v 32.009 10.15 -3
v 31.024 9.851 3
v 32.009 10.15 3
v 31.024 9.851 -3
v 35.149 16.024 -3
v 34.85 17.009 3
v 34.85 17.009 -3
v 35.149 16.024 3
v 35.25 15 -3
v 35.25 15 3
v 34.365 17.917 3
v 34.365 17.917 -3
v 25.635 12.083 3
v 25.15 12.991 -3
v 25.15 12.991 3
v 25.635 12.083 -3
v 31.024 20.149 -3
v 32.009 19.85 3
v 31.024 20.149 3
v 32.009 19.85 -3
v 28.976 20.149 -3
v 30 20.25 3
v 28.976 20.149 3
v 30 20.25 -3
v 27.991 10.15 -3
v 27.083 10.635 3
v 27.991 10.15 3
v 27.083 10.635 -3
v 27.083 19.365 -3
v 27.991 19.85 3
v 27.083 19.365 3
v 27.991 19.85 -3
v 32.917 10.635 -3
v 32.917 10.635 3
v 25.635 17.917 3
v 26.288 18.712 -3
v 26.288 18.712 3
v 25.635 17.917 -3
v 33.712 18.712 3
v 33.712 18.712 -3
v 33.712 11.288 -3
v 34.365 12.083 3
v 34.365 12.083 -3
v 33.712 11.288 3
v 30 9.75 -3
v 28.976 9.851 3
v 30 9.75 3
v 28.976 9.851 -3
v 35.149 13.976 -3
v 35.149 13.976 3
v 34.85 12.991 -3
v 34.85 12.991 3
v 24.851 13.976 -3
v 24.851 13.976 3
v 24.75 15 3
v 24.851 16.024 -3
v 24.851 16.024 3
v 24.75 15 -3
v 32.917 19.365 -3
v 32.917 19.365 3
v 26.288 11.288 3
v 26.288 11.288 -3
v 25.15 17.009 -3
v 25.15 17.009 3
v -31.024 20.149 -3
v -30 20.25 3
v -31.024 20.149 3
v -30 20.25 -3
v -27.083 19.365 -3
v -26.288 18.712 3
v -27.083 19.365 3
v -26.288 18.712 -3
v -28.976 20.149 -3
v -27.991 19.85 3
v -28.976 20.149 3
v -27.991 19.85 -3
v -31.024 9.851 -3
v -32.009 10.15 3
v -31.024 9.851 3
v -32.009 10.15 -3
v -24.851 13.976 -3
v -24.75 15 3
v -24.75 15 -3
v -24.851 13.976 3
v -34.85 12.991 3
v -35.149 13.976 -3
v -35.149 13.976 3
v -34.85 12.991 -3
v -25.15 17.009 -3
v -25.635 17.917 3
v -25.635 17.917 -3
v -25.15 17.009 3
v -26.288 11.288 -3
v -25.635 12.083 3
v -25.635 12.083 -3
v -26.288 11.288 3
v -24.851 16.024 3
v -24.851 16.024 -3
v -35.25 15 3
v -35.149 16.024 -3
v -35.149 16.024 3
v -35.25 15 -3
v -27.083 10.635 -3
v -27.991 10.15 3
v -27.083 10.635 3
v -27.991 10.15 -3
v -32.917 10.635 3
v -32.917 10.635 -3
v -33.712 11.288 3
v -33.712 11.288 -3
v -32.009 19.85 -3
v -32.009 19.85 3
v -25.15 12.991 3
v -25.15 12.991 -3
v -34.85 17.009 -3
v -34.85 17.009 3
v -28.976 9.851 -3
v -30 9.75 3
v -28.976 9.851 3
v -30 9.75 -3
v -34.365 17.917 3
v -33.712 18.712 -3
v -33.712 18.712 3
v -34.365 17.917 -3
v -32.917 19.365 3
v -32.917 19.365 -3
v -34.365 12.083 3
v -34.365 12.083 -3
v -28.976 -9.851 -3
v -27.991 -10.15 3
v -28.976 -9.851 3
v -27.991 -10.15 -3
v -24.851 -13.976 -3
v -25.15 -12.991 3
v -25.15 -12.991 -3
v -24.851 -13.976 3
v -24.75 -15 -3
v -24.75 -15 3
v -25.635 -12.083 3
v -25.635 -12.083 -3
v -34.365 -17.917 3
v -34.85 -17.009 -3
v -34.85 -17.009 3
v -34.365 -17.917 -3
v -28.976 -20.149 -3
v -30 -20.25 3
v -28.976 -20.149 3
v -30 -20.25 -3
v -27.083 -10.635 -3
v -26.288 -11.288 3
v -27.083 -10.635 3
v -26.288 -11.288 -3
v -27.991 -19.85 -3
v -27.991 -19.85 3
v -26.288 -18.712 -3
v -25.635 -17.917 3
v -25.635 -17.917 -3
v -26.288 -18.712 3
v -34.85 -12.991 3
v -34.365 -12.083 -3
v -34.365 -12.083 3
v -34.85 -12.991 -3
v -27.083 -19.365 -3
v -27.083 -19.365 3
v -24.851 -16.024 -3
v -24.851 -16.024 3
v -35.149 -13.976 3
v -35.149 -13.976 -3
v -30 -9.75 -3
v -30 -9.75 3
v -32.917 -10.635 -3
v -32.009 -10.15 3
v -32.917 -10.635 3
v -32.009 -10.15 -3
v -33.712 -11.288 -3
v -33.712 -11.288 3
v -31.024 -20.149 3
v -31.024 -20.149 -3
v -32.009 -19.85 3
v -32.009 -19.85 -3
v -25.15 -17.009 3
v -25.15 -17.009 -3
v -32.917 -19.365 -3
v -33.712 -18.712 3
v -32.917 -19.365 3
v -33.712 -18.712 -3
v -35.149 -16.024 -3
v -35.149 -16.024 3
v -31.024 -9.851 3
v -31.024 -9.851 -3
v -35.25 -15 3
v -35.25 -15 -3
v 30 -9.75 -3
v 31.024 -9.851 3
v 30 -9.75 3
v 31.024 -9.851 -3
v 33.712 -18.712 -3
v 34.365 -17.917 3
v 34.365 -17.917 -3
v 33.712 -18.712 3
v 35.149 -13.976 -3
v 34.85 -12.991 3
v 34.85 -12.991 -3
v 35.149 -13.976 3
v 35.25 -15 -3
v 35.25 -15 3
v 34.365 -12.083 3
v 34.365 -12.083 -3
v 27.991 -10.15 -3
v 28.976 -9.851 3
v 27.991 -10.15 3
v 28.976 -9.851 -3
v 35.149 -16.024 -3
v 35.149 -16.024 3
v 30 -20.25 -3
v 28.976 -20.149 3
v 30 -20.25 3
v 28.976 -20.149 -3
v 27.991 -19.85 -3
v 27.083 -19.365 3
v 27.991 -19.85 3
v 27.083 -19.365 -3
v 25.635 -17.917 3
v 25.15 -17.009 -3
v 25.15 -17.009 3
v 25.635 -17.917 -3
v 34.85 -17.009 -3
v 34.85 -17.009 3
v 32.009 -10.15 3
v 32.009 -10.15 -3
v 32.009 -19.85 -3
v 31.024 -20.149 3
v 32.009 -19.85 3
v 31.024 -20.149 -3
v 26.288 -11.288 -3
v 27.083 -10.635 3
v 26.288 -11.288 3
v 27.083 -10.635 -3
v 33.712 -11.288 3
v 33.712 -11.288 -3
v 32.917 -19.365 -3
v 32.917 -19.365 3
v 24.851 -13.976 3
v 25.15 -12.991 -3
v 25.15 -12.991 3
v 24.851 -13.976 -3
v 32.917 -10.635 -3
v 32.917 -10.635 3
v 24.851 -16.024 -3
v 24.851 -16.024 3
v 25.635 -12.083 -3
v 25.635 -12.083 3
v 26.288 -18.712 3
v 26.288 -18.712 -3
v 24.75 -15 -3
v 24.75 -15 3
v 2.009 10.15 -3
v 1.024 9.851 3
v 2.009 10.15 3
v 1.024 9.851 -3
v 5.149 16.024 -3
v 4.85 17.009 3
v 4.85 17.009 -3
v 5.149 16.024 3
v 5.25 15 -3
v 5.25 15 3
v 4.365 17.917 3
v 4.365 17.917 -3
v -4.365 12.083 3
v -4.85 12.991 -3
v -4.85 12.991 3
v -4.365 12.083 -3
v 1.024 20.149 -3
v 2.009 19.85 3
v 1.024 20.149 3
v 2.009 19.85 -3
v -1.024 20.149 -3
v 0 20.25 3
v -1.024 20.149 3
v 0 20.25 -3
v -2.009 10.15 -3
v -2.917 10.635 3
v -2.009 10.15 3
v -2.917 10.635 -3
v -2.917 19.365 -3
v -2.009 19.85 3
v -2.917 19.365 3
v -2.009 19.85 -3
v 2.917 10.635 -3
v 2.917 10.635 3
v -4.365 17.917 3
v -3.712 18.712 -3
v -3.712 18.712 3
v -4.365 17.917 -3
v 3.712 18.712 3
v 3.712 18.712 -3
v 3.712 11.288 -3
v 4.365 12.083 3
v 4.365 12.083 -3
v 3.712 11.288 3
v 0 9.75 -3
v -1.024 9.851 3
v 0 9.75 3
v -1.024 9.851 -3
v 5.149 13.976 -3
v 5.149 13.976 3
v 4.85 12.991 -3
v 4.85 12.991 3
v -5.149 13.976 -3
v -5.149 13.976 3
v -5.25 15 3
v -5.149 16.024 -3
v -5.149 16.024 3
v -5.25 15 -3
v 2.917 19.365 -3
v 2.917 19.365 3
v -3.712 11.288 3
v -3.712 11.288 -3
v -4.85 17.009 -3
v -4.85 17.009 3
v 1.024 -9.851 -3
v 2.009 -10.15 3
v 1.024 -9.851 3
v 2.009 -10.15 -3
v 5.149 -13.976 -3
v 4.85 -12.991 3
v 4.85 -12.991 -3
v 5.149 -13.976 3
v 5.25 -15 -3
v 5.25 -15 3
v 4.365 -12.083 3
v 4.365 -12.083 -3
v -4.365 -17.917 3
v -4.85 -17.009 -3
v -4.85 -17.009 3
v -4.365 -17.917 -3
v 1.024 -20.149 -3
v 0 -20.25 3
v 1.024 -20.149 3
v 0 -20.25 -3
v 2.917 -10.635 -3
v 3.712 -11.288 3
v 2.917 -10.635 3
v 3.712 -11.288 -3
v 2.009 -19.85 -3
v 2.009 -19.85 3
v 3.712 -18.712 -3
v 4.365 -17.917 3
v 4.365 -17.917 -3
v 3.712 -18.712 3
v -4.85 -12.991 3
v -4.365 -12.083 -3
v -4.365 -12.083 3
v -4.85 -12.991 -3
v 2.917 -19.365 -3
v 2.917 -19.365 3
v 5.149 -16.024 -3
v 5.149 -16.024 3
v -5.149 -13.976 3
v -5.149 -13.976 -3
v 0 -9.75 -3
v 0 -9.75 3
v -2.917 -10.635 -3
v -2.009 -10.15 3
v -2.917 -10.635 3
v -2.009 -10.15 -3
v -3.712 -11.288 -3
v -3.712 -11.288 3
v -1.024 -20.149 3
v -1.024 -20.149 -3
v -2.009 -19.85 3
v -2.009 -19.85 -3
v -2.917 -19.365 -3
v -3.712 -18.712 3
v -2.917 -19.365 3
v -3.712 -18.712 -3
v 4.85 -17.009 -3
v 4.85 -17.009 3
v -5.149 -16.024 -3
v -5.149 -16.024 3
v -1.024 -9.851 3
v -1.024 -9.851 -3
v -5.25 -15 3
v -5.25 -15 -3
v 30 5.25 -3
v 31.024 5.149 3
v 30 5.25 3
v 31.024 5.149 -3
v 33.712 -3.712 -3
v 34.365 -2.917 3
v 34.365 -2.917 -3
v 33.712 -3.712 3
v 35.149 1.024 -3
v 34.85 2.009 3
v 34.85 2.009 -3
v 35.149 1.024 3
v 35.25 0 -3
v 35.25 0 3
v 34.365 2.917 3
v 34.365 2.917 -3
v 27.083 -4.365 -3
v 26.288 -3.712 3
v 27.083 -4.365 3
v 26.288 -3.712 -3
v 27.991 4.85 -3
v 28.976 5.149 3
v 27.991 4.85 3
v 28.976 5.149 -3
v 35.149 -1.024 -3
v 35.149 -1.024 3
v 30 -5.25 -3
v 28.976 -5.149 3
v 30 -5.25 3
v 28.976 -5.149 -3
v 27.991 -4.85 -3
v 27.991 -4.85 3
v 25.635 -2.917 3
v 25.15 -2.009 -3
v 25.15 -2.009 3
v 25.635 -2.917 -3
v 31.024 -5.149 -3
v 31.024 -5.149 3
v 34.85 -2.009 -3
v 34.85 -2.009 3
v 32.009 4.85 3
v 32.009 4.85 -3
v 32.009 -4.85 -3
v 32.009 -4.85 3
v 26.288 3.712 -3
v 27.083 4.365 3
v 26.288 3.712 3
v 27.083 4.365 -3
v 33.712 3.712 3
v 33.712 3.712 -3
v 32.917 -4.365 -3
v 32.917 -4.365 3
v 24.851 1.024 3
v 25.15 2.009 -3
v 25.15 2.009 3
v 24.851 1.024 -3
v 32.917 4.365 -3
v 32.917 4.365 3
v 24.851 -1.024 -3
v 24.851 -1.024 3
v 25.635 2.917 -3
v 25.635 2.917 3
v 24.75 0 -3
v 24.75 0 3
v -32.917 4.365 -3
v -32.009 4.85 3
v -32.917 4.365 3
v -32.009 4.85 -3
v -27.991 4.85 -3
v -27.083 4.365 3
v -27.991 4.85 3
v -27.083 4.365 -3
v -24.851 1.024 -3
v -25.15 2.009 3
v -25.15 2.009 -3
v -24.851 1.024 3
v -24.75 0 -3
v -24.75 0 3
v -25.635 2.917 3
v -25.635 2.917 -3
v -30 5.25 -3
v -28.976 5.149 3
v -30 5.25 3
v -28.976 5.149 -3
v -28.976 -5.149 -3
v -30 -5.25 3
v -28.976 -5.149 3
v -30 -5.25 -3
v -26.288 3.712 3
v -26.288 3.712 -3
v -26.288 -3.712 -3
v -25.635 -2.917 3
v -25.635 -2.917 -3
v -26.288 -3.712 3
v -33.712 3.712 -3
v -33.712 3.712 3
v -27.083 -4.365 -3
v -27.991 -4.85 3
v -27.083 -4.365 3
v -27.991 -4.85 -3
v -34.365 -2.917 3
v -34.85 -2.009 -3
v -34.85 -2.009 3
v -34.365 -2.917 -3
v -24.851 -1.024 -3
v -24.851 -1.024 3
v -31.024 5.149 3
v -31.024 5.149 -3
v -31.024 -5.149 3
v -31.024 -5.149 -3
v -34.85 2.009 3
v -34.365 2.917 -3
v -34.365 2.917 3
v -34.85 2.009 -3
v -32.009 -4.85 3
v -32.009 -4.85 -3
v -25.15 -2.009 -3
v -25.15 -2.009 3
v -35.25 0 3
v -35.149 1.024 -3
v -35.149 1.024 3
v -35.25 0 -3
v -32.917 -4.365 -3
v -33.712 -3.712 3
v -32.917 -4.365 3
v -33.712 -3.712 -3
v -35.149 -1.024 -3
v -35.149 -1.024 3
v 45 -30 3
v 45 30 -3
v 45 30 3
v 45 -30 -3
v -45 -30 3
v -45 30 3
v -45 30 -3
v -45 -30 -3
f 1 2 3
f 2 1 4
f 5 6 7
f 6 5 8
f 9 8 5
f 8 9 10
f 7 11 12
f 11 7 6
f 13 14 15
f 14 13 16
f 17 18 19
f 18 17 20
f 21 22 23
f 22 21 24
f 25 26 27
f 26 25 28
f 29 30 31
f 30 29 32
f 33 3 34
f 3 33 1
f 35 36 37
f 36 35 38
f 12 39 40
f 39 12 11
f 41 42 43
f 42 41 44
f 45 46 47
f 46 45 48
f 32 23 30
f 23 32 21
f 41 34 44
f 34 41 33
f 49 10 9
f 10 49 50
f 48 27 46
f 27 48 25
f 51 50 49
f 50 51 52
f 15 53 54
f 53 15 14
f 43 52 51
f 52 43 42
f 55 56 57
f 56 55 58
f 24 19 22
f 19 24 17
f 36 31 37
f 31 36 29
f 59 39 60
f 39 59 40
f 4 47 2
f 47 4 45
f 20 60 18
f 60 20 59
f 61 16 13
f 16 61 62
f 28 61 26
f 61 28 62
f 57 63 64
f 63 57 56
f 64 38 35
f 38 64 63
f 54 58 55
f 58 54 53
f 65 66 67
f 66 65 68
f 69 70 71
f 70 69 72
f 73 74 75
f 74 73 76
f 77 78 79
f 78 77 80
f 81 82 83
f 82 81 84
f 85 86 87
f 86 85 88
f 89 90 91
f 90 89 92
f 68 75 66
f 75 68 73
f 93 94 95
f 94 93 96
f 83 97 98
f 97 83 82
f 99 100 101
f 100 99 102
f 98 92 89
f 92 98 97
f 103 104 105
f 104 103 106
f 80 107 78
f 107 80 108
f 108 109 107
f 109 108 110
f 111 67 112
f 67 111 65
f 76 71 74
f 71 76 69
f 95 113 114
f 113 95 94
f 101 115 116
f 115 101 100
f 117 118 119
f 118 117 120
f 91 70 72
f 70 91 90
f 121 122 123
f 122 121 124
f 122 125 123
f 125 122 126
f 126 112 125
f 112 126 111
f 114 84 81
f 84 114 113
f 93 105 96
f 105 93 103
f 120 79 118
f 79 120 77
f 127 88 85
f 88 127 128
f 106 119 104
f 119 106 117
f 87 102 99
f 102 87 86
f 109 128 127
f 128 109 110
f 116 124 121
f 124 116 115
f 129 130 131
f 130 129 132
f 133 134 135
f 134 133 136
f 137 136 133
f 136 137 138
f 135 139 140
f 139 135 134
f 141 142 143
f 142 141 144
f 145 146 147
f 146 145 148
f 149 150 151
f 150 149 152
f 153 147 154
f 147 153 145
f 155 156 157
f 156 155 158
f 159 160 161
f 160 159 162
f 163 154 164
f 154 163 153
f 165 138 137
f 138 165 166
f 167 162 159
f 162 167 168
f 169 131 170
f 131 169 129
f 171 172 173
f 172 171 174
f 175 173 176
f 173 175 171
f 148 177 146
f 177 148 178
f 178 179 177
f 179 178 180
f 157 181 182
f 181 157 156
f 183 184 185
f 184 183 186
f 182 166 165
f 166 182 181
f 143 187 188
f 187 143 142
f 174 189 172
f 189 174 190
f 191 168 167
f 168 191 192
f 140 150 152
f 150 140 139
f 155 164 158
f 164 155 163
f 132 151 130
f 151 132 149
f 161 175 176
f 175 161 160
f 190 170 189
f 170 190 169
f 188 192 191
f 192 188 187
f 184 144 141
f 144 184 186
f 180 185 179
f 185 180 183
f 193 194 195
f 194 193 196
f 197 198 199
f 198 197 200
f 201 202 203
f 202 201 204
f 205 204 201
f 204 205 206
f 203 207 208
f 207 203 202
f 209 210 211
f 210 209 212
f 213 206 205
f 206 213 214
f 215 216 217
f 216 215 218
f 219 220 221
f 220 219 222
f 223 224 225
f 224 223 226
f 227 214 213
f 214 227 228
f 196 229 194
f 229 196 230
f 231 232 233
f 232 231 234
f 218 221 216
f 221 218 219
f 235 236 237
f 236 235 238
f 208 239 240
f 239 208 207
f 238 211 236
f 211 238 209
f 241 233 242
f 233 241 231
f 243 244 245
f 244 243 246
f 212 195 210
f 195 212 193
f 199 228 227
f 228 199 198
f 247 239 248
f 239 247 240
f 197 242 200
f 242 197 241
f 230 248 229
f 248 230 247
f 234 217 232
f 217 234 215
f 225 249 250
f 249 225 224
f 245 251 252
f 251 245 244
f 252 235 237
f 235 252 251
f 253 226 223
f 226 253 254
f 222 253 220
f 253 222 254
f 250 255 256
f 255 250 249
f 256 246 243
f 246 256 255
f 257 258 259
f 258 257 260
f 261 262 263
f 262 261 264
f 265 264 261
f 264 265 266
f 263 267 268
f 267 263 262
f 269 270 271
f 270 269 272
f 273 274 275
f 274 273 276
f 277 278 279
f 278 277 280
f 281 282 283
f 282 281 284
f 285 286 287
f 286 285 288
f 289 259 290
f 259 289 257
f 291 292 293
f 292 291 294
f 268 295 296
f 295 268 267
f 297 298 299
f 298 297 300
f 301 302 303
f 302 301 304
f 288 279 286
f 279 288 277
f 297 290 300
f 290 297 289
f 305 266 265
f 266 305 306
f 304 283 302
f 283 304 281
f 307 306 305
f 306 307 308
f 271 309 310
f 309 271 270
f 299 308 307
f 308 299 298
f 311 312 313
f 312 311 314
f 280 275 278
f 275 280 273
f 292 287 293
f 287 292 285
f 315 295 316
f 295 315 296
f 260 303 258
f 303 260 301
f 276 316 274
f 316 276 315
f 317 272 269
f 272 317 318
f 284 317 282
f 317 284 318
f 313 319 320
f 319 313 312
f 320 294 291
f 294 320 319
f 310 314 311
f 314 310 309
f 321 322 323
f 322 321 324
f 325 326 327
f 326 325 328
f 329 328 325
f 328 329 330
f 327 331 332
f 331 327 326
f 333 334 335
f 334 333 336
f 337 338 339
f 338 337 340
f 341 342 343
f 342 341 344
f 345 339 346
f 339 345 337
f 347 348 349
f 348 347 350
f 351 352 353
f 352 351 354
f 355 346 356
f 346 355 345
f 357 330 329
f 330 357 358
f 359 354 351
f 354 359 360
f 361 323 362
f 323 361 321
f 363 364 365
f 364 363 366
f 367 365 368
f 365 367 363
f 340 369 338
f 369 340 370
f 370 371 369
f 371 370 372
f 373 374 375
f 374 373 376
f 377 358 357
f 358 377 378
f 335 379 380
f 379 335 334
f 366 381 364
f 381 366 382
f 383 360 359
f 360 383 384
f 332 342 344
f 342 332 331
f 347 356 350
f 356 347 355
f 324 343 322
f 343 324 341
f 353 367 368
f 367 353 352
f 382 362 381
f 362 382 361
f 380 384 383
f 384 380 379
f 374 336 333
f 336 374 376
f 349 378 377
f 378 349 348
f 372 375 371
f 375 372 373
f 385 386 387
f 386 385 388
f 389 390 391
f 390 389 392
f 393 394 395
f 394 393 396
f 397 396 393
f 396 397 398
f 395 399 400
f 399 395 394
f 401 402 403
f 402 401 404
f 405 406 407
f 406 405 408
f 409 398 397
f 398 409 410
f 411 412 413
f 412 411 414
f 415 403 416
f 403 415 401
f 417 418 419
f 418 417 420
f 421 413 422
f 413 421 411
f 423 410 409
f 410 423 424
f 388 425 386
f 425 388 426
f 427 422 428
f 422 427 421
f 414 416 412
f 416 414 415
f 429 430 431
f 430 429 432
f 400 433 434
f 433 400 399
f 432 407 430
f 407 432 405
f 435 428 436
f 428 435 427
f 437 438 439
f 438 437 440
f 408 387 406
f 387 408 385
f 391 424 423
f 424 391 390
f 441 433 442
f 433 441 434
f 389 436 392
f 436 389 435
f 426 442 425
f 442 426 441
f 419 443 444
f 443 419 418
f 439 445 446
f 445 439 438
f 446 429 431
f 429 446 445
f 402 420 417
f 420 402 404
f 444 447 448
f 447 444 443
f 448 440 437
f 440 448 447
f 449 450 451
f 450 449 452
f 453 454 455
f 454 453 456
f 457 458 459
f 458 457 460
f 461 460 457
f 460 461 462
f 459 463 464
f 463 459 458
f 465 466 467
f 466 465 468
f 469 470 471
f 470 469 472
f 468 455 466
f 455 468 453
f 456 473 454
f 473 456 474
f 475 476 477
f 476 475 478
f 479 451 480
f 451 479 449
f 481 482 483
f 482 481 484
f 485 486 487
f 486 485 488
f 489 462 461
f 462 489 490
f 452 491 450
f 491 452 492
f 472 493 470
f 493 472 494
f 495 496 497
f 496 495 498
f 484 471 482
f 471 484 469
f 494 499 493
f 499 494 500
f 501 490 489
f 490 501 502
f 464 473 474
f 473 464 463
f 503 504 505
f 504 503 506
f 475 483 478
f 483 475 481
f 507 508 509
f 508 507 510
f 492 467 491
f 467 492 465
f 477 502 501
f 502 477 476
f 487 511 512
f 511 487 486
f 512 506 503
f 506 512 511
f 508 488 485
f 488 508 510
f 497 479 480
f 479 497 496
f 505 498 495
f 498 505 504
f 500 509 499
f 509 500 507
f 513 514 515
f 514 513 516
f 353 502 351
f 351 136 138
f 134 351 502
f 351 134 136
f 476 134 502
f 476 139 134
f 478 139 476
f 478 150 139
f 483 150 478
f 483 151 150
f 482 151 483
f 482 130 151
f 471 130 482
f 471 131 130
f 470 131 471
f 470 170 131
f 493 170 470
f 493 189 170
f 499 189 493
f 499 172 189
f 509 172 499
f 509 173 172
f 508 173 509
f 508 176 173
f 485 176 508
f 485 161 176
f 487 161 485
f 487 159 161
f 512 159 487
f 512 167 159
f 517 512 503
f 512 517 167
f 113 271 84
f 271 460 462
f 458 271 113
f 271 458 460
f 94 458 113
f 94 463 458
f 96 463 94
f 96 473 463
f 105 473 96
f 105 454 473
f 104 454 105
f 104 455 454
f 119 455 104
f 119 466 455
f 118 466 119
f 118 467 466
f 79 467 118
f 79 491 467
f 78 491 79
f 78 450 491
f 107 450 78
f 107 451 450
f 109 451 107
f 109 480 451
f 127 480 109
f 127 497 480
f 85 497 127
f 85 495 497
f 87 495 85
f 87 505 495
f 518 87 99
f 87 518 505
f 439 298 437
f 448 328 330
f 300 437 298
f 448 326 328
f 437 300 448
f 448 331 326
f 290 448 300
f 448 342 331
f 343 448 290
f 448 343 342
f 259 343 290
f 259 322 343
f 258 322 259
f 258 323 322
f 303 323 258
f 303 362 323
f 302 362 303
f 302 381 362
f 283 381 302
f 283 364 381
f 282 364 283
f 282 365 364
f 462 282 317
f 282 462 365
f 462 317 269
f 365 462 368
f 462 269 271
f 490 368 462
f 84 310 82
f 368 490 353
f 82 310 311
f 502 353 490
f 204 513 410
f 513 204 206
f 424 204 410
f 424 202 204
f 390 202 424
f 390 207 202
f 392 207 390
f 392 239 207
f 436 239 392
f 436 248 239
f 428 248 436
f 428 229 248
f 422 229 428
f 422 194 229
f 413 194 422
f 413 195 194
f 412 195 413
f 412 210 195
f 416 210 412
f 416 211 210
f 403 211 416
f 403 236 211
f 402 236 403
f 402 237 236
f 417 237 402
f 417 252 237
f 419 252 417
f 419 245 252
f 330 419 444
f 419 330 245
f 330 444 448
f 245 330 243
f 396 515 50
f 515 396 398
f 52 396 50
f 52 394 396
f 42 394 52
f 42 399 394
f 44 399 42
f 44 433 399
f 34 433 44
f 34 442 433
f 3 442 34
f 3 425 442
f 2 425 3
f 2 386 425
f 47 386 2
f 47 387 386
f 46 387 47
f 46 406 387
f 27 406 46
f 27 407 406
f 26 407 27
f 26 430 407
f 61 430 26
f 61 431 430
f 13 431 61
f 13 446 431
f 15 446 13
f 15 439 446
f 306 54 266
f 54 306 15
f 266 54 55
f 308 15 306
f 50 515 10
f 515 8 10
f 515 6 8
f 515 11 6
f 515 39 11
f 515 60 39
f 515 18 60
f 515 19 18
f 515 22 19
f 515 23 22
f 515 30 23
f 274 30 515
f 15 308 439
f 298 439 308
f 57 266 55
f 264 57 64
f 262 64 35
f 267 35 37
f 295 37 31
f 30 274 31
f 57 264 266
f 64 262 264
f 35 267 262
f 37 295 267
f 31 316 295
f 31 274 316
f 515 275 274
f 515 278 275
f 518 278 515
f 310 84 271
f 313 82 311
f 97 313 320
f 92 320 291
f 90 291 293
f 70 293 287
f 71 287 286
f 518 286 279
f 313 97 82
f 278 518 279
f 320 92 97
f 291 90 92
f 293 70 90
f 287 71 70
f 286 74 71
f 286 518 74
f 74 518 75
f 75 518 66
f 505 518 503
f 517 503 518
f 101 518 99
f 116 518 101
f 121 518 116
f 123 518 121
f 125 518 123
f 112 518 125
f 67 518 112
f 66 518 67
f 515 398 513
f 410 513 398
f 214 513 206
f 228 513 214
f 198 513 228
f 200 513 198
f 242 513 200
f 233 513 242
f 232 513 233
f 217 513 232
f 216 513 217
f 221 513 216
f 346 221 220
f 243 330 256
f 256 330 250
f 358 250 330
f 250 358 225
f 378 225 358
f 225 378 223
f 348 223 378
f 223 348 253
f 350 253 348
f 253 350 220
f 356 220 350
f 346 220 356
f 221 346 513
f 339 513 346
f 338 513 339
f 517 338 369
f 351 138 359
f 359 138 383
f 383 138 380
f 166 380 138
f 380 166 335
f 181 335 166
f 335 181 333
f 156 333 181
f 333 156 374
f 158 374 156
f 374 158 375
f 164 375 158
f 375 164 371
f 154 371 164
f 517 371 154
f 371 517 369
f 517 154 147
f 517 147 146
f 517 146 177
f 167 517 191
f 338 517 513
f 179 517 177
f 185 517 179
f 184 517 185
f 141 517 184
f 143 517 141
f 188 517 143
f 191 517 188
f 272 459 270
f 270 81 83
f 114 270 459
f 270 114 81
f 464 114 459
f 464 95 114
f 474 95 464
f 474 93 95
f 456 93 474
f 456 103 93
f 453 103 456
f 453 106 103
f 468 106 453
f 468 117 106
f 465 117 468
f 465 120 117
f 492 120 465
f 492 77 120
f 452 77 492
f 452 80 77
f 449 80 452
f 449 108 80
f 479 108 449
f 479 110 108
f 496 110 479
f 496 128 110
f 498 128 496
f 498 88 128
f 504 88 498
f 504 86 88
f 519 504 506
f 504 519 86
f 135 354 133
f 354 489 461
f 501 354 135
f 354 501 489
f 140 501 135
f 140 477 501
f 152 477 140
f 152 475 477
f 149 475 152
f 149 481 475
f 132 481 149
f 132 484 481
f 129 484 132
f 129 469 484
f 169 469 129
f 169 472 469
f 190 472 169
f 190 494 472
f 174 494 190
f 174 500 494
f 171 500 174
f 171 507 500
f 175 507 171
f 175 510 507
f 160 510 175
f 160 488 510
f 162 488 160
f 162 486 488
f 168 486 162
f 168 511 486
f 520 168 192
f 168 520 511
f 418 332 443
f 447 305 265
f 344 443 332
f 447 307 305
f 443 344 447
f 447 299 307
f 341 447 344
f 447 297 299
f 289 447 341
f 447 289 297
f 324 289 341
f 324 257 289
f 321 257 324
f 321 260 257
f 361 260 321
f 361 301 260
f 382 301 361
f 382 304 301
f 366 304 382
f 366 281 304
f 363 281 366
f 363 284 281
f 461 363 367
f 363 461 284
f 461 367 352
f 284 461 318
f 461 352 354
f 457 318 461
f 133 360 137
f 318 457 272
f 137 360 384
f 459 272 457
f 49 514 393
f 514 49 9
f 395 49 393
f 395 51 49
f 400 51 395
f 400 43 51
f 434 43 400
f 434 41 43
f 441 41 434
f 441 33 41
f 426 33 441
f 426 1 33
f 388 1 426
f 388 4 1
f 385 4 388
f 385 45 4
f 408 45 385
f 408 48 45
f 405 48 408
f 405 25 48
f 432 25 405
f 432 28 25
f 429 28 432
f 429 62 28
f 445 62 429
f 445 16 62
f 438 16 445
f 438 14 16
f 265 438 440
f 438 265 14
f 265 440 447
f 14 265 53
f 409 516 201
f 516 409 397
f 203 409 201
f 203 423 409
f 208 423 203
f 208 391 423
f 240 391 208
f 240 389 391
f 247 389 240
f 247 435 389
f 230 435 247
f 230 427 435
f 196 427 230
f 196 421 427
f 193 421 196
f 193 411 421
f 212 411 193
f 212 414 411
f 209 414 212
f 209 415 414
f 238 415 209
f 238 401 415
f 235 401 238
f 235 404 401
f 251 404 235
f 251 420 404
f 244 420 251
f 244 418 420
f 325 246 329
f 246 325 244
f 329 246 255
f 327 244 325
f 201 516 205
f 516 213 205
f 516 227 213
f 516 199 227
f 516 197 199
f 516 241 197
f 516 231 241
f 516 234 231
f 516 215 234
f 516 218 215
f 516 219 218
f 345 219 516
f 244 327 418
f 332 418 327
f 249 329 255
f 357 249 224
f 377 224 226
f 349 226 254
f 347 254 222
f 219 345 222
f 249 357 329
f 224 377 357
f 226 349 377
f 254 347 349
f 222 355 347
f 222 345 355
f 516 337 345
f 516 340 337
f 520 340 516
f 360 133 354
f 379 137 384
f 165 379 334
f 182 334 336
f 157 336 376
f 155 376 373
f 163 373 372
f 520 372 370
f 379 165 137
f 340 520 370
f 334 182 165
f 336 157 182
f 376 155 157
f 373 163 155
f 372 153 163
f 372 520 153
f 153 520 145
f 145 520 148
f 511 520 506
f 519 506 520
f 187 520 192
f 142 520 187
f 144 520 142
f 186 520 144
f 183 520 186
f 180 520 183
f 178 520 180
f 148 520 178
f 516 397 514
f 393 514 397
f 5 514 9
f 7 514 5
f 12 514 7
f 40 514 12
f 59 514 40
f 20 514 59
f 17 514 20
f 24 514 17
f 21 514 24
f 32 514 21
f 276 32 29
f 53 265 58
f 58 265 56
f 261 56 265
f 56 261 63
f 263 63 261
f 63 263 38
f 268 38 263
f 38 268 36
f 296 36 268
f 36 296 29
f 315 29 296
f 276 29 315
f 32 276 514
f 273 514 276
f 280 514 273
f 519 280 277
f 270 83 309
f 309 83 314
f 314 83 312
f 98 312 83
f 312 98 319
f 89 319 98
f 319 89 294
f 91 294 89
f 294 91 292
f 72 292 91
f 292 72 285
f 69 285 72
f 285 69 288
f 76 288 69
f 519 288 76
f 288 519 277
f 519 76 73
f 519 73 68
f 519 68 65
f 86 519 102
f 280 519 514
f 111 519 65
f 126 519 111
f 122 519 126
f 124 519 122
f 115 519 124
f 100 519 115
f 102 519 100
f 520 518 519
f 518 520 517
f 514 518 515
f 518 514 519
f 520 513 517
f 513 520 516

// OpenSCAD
$fn = 32;

// ----------------------------------------------------------------------
// Corner plate 90 x 60 x 6
// 8 holes, centres taken from the edge offset
// ----------------------------------------------------------------------

// --- parameters (mm) ---
plate = [90, 60, 6];  // overall size (x, y, z)
holes = 8;            // number of holes the drawing asks for
hole_d = 10.5;        // hole diameter
edge = 15;            // hole centre offset from the plate edge

// --- derived feature positions (mm) ---
corner_x = plate[0] / 2 - edge;  // = 30   corner hole X
corner_y = plate[1] / 2 - edge;  // = 15   corner hole Y
feature_centers = [
  [corner_x, corner_y],
  [-corner_x, corner_y],
  [-corner_x, -corner_y],
  [corner_x, -corner_y],
  [0, corner_y],
  [0, -corner_y],
  [corner_x, 0],
  [-corner_x, 0]
];   // hole centres the loop below drills

// plate outline, every hole drilled through with the same cutters
difference() {
  cube(plate, center = true);
  for (centre = feature_centers)
    translate([centre[0], centre[1], 0])
      cylinder(d = hole_d, h = plate[2] + 2, center = true);
}
